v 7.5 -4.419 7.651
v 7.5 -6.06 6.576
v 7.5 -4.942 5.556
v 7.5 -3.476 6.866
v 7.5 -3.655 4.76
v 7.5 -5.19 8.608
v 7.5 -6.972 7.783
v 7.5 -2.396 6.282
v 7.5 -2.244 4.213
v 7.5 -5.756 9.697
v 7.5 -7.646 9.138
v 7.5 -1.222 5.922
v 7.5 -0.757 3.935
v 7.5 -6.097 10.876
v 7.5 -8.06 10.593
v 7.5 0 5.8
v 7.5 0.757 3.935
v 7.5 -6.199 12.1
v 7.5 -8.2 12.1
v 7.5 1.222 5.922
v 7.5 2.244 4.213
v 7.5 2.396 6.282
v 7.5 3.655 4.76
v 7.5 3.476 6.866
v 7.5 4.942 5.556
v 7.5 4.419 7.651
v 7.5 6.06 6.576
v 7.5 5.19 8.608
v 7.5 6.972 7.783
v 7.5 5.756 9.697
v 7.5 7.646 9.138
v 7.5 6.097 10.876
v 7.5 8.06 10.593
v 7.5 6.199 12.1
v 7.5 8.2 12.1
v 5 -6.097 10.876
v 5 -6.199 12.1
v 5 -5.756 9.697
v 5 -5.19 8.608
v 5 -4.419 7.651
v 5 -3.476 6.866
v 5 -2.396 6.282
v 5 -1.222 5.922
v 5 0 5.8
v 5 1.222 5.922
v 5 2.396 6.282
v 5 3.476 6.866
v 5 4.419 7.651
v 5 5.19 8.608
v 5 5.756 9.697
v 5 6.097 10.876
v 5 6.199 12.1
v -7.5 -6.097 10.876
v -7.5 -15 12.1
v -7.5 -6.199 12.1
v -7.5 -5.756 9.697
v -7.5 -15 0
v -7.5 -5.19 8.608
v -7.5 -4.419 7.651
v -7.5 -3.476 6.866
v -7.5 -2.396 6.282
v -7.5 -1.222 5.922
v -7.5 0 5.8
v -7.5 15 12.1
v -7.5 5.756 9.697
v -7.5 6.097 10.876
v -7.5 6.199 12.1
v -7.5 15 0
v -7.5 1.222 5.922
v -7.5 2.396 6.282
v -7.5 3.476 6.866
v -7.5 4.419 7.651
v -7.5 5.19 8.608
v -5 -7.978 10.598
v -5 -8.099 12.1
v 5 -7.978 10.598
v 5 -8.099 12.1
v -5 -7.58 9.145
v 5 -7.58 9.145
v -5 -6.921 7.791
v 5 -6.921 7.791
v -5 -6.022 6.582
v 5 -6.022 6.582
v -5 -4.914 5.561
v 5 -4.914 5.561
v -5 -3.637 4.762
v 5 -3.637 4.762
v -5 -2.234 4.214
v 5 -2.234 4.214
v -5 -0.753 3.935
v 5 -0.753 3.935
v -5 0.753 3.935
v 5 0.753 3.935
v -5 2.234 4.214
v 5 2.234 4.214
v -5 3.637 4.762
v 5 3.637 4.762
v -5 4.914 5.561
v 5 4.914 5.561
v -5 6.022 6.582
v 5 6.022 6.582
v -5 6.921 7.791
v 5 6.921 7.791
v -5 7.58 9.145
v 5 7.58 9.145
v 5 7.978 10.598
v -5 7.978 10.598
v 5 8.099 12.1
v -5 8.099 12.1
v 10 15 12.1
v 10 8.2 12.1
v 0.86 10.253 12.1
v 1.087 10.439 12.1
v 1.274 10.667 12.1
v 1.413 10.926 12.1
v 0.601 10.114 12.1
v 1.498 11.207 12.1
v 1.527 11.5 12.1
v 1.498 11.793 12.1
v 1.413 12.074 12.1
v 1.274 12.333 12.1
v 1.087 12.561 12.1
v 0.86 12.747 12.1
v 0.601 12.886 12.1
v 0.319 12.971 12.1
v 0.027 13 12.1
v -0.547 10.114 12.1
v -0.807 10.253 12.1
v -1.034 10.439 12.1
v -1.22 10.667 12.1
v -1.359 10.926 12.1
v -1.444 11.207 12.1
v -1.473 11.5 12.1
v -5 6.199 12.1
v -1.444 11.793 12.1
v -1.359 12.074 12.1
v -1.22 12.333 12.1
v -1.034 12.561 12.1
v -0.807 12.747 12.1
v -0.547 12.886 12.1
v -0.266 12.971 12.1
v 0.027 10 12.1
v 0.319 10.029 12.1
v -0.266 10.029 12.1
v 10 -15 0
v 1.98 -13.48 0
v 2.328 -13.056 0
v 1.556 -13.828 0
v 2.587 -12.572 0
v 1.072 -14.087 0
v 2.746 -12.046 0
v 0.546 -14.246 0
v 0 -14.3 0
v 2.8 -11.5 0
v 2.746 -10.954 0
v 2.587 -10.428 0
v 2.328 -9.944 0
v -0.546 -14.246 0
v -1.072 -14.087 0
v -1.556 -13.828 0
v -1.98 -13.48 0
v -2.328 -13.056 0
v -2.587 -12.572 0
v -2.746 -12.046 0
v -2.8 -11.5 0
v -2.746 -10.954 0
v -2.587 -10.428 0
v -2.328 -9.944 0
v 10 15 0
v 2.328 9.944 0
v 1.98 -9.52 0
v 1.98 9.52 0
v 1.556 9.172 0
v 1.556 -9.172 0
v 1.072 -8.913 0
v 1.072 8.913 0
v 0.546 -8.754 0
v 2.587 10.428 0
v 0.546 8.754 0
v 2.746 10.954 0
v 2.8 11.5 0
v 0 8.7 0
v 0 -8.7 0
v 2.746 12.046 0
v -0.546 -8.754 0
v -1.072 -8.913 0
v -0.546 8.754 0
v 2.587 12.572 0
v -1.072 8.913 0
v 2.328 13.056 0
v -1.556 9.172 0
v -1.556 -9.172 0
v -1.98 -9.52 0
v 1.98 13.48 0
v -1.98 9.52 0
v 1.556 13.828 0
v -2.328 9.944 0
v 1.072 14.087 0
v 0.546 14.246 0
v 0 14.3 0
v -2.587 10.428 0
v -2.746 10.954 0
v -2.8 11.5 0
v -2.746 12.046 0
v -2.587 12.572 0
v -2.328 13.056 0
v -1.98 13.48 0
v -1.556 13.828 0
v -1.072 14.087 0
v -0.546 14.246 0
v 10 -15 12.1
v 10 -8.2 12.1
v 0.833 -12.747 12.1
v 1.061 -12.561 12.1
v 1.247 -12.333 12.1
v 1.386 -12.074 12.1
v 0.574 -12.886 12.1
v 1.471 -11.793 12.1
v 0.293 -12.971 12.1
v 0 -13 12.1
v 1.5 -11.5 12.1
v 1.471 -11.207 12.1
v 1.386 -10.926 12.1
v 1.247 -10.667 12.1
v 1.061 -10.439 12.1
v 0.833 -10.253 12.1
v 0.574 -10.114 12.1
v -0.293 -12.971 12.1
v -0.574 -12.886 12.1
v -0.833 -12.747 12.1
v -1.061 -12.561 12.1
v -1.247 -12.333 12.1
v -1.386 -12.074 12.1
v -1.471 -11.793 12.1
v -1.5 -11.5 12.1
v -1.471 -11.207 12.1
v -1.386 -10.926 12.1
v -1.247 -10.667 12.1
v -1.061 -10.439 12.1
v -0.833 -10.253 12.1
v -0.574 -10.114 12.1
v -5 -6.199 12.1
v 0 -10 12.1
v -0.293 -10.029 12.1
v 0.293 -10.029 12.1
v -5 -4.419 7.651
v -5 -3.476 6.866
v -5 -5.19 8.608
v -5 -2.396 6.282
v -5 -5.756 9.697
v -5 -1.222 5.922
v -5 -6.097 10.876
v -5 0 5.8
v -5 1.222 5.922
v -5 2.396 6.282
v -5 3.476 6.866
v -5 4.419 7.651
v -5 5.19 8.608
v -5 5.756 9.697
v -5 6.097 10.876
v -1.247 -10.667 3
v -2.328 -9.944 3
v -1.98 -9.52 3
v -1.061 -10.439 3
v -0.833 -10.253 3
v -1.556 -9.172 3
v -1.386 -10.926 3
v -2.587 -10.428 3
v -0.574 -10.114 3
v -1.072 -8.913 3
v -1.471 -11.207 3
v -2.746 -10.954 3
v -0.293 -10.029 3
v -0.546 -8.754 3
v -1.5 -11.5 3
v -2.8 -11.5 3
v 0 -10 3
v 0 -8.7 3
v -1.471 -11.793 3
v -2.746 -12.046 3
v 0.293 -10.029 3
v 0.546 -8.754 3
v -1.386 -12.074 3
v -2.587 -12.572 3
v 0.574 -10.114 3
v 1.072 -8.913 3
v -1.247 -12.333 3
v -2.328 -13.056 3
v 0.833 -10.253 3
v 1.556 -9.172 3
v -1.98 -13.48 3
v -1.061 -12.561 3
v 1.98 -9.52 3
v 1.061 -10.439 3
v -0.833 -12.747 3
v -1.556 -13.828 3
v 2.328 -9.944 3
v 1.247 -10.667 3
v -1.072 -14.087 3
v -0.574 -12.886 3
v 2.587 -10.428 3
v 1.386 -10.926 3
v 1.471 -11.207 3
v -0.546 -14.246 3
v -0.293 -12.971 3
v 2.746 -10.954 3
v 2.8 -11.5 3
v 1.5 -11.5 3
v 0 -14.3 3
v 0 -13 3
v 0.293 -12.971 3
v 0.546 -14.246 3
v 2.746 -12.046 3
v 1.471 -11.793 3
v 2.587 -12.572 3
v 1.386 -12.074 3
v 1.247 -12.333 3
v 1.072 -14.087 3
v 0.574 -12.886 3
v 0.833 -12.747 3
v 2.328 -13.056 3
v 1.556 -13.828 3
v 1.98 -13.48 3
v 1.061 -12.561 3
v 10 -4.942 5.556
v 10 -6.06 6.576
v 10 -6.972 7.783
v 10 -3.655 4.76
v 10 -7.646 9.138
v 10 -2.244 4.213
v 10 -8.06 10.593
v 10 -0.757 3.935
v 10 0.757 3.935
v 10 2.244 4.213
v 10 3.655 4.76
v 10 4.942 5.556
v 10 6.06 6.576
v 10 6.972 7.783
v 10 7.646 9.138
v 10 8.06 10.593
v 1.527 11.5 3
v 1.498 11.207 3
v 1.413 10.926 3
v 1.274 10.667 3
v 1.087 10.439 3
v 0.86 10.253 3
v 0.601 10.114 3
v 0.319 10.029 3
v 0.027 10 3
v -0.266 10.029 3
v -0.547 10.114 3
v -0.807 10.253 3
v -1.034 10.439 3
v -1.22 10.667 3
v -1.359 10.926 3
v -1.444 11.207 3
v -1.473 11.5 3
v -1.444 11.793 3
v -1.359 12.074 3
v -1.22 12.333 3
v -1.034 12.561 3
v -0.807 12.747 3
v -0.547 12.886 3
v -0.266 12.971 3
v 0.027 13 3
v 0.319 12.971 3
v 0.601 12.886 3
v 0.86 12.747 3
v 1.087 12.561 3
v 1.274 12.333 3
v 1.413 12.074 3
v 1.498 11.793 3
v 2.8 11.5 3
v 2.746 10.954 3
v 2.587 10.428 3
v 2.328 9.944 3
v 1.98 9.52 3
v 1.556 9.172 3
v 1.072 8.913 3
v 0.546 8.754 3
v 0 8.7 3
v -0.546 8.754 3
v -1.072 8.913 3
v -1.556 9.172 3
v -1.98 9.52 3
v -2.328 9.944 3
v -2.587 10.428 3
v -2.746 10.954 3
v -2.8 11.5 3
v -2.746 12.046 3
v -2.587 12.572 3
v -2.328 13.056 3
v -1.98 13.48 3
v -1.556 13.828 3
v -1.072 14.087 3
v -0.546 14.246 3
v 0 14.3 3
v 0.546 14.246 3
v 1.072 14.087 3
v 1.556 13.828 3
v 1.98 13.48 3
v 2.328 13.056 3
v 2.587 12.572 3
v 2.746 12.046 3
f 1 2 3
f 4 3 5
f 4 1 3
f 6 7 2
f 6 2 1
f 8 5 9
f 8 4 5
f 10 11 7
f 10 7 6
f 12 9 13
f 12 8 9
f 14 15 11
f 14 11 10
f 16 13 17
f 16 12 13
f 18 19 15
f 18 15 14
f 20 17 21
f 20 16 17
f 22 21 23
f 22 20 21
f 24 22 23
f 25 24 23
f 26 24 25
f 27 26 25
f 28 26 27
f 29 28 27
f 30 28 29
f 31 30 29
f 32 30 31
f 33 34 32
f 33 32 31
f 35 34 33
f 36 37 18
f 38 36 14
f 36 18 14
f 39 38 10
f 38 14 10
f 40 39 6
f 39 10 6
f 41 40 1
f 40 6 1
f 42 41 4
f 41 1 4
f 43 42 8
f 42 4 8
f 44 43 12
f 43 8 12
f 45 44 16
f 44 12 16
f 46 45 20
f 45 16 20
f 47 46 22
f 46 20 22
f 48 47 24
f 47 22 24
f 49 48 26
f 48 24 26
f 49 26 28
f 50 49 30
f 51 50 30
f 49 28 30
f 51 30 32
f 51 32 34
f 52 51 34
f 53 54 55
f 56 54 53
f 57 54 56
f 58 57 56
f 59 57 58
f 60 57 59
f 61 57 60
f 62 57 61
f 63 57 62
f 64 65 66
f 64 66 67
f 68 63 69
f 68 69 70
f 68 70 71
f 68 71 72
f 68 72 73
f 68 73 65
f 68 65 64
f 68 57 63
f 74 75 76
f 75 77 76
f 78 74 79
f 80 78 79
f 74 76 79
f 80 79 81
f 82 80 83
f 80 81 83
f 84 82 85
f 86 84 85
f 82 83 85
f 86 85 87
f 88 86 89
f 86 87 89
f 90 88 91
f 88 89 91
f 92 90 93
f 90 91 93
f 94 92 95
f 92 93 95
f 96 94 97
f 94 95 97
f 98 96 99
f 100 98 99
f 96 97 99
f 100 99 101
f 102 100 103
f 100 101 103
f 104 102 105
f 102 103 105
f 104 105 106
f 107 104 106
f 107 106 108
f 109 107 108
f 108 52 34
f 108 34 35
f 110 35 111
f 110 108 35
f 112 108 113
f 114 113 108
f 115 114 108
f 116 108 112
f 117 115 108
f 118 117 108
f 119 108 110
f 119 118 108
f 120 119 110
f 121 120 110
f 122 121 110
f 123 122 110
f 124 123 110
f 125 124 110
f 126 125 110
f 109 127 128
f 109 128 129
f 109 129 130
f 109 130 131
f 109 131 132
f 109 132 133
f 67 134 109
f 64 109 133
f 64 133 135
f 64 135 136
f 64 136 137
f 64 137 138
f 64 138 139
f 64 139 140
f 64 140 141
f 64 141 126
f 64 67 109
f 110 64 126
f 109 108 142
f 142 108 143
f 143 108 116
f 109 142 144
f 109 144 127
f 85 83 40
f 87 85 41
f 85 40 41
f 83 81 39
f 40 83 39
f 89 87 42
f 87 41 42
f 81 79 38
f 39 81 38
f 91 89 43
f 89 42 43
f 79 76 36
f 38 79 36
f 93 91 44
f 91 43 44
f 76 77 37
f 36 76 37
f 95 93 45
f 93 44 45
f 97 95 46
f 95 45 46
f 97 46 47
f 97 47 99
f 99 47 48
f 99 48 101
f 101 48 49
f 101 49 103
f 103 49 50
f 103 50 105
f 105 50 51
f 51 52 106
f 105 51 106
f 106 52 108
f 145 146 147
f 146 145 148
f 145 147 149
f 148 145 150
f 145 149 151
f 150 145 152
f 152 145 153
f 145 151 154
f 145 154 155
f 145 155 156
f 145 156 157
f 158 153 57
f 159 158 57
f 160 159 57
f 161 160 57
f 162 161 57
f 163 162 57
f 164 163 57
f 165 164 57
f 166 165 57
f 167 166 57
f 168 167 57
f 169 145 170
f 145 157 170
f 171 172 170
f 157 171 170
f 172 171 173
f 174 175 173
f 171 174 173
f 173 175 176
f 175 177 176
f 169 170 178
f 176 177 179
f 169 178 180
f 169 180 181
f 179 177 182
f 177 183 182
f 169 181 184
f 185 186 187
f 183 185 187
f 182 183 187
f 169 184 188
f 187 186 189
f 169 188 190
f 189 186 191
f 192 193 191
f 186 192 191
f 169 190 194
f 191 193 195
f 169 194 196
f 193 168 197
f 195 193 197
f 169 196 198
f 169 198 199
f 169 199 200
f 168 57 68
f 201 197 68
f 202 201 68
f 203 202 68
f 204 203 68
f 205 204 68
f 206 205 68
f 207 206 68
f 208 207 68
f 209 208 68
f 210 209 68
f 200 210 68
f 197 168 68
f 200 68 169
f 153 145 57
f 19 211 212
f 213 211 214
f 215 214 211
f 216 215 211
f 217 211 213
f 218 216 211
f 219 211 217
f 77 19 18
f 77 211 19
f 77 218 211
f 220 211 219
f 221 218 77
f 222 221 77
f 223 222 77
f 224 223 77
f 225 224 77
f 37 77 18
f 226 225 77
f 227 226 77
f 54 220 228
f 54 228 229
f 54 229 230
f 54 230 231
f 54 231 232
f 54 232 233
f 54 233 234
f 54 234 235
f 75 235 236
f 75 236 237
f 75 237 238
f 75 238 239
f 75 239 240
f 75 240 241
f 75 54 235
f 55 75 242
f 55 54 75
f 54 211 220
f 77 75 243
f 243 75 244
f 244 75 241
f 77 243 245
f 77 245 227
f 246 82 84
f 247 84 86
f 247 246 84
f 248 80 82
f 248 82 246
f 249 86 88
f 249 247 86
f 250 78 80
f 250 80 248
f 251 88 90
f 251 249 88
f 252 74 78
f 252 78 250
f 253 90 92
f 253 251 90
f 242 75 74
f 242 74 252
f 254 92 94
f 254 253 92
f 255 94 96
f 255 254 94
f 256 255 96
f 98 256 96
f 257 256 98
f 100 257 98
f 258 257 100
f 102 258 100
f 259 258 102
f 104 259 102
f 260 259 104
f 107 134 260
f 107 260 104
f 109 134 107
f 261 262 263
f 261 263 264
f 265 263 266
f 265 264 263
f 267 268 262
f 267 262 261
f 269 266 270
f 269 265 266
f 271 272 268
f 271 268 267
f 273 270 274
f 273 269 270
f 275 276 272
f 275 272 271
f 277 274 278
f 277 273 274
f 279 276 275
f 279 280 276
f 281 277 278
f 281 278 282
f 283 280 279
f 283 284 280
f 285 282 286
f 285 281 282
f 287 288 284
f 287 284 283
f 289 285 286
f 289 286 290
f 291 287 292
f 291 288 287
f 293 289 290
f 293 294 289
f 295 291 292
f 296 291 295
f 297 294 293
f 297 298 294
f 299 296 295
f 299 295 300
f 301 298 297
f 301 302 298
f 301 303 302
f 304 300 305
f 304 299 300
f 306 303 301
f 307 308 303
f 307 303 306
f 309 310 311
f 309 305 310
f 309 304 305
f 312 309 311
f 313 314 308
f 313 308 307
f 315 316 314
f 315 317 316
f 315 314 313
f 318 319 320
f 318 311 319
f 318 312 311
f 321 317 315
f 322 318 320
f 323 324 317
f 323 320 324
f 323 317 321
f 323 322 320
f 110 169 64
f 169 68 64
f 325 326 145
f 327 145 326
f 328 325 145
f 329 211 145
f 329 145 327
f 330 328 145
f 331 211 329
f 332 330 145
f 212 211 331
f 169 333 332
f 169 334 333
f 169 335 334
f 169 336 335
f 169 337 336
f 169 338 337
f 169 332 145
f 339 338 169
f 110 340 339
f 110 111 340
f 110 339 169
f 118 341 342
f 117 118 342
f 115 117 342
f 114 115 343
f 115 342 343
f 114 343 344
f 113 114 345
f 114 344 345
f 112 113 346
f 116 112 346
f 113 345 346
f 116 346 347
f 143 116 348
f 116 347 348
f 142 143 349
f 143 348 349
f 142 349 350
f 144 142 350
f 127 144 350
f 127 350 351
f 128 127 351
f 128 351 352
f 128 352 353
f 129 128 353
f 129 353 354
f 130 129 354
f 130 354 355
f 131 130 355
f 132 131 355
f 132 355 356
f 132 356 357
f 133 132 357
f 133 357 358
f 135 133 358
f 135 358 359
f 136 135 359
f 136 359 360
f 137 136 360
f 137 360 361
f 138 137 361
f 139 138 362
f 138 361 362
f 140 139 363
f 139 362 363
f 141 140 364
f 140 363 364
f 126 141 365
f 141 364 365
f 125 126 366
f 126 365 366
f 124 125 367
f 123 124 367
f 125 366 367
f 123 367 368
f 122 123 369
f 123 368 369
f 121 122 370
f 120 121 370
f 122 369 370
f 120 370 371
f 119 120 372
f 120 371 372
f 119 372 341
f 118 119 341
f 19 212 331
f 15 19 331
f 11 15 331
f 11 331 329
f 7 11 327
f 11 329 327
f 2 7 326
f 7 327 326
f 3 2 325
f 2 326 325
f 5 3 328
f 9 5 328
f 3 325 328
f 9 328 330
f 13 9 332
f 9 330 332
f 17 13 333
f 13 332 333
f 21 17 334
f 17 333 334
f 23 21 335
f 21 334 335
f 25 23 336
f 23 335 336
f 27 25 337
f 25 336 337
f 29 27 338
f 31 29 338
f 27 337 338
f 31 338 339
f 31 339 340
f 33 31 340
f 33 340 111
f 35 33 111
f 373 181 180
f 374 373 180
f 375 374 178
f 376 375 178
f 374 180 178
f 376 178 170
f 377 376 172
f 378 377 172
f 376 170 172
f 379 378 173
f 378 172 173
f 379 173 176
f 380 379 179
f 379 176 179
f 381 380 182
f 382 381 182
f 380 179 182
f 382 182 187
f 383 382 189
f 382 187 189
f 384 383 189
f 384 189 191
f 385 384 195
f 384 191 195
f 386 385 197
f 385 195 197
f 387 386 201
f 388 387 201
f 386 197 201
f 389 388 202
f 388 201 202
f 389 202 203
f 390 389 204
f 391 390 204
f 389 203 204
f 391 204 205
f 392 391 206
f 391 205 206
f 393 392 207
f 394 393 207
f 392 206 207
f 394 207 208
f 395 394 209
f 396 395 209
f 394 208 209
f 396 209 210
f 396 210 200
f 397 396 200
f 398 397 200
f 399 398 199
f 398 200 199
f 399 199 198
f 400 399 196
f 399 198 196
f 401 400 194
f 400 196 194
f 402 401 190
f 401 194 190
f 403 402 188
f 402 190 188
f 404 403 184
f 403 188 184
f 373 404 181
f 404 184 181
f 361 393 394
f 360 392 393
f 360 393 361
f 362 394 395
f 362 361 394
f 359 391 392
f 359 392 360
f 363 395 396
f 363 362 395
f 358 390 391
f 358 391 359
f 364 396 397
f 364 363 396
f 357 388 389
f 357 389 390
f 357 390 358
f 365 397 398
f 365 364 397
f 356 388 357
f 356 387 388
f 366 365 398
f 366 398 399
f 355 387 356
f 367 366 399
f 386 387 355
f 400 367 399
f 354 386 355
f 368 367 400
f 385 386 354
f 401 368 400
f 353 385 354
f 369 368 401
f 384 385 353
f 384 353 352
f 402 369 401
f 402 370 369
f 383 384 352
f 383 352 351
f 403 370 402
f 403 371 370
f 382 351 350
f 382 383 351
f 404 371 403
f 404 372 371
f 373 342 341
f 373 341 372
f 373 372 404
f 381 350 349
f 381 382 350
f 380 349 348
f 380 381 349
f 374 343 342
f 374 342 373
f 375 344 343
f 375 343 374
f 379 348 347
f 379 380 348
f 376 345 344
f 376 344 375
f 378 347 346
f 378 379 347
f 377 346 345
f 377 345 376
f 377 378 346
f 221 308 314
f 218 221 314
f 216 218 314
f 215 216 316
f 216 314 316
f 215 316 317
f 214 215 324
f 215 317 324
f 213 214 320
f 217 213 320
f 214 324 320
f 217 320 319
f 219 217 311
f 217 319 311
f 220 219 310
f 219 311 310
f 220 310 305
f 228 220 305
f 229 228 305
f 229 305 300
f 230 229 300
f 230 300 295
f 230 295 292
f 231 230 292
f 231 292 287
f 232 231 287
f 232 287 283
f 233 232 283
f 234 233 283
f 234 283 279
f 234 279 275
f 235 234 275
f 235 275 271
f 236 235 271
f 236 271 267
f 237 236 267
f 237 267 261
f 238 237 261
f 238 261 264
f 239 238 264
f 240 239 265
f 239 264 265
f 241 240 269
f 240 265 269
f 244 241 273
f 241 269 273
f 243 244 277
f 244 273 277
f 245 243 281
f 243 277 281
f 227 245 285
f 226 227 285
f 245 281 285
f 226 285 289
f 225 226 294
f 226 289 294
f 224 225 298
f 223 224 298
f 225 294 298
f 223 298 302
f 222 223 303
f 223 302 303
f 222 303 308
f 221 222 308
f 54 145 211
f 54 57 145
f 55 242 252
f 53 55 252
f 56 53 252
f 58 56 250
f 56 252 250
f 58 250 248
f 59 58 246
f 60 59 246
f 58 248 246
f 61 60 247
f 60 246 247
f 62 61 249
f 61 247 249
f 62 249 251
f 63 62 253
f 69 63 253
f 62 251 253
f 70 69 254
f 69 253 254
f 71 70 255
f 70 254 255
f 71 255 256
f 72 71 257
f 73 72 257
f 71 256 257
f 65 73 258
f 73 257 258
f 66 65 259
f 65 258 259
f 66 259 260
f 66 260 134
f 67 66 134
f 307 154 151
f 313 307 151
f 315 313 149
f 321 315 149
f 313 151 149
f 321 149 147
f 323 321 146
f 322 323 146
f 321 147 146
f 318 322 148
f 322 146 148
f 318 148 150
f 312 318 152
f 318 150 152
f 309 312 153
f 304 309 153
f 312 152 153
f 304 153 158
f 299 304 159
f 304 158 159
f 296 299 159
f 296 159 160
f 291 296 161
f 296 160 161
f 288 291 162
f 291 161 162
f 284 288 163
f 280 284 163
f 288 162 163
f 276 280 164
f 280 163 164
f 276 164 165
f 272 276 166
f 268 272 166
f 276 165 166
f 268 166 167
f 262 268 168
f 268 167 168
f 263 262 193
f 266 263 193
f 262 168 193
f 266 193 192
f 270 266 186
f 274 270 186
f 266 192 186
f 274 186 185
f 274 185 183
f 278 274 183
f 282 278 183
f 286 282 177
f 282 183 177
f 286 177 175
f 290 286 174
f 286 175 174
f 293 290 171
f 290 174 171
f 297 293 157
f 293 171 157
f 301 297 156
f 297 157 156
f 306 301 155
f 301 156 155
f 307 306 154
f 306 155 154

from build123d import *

# Parameters (mm, degrees)
SKETCH002_R     = 8.1
PAD001_DEPTH    = 5
SKETCH_W        = 15
SKETCH_H        = 30
PAD_DEPTH       = 12.1
SKETCH001_R     = 6.2
POCKET_DEPTH    = 15.001
SKETCH003_R     = 1.5
POCKET001_DEPTH = 12.101
SKETCH004_R     = 2.8
POCKET002_DEPTH = 3
SKETCH005_W     = 30
SKETCH005_H     = 12.1
PAD002_DEPTH    = 2.5
SKETCH006_R     = 8.2
POCKET003_DEPTH = 2.5


with BuildPart() as pad001:
    # Sketch002 → Pad001 (new body, symmetric)
    with BuildSketch(Plane.YZ):
        with Locations((0, 12)):
            Circle(SKETCH002_R)
    extrude(amount=PAD001_DEPTH, both=True)


with BuildPart() as pocket003:
    # Sketch → Pad (new body)
    with BuildSketch(Plane.XY):
        Rectangle(SKETCH_W, SKETCH_H)
    extrude(amount=PAD_DEPTH)

    # Sketch001 → Pocket (cut, through all)
    with BuildSketch(Plane.YZ.offset(7.5)):
        with Locations((0, 12)):
            Circle(SKETCH001_R)
    extrude(amount=-POCKET_DEPTH, mode=Mode.SUBTRACT)

    # Cut: cut Pad001
    add(pad001.part, mode=Mode.SUBTRACT)

    # Sketch003 → Pocket001 (cut, through all)
    with BuildSketch(Plane(origin=(0, 0, 0), x_dir=(1, 0, 0), z_dir=(0, 0, -1))):
        with Locations((0.026833, -11.5)):
            Circle(SKETCH003_R)
        with Locations((0, 11.5)):
            Circle(SKETCH003_R)
    extrude(amount=-POCKET001_DEPTH, mode=Mode.SUBTRACT)

    # Sketch004 → Pocket002 (cut)
    with BuildSketch(Plane(origin=(0, 0, 0), x_dir=(1, 0, 0), z_dir=(0, 0, -1))):
        with Locations((0, 11.5)):
            Circle(SKETCH004_R)
        with Locations((0, -11.5)):
            Circle(SKETCH004_R)
    extrude(amount=-POCKET002_DEPTH, mode=Mode.SUBTRACT)

    # Sketch005 → Pad002 (new body)
    with BuildSketch(Plane.YZ.offset(7.5)):
        with Locations((0, 6.05)):
            Rectangle(SKETCH005_W, SKETCH005_H)
    extrude(amount=PAD002_DEPTH)

    # Sketch006 → Pocket003 (cut)
    with BuildSketch(Plane.YZ.offset(10)):
        with Locations((0, 12.1)):
            Circle(SKETCH006_R)
    extrude(amount=-POCKET003_DEPTH, mode=Mode.SUBTRACT)


solid = pocket003.part
